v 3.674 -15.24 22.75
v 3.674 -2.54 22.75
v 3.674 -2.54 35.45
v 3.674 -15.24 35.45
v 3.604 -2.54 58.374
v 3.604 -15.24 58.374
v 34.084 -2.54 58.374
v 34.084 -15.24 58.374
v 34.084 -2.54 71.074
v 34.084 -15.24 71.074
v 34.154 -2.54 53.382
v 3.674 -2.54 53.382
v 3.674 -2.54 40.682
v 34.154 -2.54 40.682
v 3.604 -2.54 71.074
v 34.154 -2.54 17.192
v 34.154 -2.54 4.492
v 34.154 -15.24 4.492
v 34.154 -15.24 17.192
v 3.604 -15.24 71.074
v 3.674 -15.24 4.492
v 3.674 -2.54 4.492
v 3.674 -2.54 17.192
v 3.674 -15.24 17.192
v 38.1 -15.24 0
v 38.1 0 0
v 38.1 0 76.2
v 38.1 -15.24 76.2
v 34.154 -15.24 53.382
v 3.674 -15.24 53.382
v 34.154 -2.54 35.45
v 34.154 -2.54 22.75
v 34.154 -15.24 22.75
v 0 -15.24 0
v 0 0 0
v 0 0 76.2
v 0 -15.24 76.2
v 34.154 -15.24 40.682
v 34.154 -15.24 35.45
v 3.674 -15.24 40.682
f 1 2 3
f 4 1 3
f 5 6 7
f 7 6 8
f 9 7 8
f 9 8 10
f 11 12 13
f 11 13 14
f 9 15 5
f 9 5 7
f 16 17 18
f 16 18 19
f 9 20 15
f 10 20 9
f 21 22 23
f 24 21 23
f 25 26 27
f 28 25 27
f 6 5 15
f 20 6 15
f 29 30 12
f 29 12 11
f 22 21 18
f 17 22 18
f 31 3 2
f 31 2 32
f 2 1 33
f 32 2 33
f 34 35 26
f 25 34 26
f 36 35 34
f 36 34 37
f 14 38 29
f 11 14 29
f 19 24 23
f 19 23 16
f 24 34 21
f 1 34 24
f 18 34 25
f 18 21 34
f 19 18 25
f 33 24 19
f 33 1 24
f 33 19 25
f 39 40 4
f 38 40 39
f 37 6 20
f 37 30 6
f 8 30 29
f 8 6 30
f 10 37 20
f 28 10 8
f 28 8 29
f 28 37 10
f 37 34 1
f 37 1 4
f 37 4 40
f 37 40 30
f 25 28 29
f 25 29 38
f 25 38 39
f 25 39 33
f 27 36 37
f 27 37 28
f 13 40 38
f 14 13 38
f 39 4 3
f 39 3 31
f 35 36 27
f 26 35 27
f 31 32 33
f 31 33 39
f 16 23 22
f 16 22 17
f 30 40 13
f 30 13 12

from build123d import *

# Parameters (mm, degrees)
F0_W     = 38.1
F0_H     = 76.2
F1_DEPTH = 15.24
F2_W     = 30.48
F2_H     = 12.7
F3_DEPTH = 12.7


with BuildPart() as f1:
    # F0 (on Front) → F1 (new body)
    with BuildSketch(Plane.XZ):
        with Locations((19.05, 38.1)):
            Rectangle(F0_W, F0_H)
    extrude(amount=F1_DEPTH)

    # F2 (on face) → F3 (cut)
    with BuildSketch(Plane.XZ.offset(15.24)):
        with Locations((18.9144, 47.031553)):
            Rectangle(F2_W, F2_H)
        with Locations((18.9144, 29.099608)):
            Rectangle(F2_W, F2_H)
        with Locations((18.9144, 10.842167)):
            Rectangle(F2_W, F2_H)
        with Locations((18.84441, 64.723954)):
            Rectangle(F2_W, F2_H)
    extrude(amount=-F3_DEPTH, mode=Mode.SUBTRACT)


solid = f1.part
